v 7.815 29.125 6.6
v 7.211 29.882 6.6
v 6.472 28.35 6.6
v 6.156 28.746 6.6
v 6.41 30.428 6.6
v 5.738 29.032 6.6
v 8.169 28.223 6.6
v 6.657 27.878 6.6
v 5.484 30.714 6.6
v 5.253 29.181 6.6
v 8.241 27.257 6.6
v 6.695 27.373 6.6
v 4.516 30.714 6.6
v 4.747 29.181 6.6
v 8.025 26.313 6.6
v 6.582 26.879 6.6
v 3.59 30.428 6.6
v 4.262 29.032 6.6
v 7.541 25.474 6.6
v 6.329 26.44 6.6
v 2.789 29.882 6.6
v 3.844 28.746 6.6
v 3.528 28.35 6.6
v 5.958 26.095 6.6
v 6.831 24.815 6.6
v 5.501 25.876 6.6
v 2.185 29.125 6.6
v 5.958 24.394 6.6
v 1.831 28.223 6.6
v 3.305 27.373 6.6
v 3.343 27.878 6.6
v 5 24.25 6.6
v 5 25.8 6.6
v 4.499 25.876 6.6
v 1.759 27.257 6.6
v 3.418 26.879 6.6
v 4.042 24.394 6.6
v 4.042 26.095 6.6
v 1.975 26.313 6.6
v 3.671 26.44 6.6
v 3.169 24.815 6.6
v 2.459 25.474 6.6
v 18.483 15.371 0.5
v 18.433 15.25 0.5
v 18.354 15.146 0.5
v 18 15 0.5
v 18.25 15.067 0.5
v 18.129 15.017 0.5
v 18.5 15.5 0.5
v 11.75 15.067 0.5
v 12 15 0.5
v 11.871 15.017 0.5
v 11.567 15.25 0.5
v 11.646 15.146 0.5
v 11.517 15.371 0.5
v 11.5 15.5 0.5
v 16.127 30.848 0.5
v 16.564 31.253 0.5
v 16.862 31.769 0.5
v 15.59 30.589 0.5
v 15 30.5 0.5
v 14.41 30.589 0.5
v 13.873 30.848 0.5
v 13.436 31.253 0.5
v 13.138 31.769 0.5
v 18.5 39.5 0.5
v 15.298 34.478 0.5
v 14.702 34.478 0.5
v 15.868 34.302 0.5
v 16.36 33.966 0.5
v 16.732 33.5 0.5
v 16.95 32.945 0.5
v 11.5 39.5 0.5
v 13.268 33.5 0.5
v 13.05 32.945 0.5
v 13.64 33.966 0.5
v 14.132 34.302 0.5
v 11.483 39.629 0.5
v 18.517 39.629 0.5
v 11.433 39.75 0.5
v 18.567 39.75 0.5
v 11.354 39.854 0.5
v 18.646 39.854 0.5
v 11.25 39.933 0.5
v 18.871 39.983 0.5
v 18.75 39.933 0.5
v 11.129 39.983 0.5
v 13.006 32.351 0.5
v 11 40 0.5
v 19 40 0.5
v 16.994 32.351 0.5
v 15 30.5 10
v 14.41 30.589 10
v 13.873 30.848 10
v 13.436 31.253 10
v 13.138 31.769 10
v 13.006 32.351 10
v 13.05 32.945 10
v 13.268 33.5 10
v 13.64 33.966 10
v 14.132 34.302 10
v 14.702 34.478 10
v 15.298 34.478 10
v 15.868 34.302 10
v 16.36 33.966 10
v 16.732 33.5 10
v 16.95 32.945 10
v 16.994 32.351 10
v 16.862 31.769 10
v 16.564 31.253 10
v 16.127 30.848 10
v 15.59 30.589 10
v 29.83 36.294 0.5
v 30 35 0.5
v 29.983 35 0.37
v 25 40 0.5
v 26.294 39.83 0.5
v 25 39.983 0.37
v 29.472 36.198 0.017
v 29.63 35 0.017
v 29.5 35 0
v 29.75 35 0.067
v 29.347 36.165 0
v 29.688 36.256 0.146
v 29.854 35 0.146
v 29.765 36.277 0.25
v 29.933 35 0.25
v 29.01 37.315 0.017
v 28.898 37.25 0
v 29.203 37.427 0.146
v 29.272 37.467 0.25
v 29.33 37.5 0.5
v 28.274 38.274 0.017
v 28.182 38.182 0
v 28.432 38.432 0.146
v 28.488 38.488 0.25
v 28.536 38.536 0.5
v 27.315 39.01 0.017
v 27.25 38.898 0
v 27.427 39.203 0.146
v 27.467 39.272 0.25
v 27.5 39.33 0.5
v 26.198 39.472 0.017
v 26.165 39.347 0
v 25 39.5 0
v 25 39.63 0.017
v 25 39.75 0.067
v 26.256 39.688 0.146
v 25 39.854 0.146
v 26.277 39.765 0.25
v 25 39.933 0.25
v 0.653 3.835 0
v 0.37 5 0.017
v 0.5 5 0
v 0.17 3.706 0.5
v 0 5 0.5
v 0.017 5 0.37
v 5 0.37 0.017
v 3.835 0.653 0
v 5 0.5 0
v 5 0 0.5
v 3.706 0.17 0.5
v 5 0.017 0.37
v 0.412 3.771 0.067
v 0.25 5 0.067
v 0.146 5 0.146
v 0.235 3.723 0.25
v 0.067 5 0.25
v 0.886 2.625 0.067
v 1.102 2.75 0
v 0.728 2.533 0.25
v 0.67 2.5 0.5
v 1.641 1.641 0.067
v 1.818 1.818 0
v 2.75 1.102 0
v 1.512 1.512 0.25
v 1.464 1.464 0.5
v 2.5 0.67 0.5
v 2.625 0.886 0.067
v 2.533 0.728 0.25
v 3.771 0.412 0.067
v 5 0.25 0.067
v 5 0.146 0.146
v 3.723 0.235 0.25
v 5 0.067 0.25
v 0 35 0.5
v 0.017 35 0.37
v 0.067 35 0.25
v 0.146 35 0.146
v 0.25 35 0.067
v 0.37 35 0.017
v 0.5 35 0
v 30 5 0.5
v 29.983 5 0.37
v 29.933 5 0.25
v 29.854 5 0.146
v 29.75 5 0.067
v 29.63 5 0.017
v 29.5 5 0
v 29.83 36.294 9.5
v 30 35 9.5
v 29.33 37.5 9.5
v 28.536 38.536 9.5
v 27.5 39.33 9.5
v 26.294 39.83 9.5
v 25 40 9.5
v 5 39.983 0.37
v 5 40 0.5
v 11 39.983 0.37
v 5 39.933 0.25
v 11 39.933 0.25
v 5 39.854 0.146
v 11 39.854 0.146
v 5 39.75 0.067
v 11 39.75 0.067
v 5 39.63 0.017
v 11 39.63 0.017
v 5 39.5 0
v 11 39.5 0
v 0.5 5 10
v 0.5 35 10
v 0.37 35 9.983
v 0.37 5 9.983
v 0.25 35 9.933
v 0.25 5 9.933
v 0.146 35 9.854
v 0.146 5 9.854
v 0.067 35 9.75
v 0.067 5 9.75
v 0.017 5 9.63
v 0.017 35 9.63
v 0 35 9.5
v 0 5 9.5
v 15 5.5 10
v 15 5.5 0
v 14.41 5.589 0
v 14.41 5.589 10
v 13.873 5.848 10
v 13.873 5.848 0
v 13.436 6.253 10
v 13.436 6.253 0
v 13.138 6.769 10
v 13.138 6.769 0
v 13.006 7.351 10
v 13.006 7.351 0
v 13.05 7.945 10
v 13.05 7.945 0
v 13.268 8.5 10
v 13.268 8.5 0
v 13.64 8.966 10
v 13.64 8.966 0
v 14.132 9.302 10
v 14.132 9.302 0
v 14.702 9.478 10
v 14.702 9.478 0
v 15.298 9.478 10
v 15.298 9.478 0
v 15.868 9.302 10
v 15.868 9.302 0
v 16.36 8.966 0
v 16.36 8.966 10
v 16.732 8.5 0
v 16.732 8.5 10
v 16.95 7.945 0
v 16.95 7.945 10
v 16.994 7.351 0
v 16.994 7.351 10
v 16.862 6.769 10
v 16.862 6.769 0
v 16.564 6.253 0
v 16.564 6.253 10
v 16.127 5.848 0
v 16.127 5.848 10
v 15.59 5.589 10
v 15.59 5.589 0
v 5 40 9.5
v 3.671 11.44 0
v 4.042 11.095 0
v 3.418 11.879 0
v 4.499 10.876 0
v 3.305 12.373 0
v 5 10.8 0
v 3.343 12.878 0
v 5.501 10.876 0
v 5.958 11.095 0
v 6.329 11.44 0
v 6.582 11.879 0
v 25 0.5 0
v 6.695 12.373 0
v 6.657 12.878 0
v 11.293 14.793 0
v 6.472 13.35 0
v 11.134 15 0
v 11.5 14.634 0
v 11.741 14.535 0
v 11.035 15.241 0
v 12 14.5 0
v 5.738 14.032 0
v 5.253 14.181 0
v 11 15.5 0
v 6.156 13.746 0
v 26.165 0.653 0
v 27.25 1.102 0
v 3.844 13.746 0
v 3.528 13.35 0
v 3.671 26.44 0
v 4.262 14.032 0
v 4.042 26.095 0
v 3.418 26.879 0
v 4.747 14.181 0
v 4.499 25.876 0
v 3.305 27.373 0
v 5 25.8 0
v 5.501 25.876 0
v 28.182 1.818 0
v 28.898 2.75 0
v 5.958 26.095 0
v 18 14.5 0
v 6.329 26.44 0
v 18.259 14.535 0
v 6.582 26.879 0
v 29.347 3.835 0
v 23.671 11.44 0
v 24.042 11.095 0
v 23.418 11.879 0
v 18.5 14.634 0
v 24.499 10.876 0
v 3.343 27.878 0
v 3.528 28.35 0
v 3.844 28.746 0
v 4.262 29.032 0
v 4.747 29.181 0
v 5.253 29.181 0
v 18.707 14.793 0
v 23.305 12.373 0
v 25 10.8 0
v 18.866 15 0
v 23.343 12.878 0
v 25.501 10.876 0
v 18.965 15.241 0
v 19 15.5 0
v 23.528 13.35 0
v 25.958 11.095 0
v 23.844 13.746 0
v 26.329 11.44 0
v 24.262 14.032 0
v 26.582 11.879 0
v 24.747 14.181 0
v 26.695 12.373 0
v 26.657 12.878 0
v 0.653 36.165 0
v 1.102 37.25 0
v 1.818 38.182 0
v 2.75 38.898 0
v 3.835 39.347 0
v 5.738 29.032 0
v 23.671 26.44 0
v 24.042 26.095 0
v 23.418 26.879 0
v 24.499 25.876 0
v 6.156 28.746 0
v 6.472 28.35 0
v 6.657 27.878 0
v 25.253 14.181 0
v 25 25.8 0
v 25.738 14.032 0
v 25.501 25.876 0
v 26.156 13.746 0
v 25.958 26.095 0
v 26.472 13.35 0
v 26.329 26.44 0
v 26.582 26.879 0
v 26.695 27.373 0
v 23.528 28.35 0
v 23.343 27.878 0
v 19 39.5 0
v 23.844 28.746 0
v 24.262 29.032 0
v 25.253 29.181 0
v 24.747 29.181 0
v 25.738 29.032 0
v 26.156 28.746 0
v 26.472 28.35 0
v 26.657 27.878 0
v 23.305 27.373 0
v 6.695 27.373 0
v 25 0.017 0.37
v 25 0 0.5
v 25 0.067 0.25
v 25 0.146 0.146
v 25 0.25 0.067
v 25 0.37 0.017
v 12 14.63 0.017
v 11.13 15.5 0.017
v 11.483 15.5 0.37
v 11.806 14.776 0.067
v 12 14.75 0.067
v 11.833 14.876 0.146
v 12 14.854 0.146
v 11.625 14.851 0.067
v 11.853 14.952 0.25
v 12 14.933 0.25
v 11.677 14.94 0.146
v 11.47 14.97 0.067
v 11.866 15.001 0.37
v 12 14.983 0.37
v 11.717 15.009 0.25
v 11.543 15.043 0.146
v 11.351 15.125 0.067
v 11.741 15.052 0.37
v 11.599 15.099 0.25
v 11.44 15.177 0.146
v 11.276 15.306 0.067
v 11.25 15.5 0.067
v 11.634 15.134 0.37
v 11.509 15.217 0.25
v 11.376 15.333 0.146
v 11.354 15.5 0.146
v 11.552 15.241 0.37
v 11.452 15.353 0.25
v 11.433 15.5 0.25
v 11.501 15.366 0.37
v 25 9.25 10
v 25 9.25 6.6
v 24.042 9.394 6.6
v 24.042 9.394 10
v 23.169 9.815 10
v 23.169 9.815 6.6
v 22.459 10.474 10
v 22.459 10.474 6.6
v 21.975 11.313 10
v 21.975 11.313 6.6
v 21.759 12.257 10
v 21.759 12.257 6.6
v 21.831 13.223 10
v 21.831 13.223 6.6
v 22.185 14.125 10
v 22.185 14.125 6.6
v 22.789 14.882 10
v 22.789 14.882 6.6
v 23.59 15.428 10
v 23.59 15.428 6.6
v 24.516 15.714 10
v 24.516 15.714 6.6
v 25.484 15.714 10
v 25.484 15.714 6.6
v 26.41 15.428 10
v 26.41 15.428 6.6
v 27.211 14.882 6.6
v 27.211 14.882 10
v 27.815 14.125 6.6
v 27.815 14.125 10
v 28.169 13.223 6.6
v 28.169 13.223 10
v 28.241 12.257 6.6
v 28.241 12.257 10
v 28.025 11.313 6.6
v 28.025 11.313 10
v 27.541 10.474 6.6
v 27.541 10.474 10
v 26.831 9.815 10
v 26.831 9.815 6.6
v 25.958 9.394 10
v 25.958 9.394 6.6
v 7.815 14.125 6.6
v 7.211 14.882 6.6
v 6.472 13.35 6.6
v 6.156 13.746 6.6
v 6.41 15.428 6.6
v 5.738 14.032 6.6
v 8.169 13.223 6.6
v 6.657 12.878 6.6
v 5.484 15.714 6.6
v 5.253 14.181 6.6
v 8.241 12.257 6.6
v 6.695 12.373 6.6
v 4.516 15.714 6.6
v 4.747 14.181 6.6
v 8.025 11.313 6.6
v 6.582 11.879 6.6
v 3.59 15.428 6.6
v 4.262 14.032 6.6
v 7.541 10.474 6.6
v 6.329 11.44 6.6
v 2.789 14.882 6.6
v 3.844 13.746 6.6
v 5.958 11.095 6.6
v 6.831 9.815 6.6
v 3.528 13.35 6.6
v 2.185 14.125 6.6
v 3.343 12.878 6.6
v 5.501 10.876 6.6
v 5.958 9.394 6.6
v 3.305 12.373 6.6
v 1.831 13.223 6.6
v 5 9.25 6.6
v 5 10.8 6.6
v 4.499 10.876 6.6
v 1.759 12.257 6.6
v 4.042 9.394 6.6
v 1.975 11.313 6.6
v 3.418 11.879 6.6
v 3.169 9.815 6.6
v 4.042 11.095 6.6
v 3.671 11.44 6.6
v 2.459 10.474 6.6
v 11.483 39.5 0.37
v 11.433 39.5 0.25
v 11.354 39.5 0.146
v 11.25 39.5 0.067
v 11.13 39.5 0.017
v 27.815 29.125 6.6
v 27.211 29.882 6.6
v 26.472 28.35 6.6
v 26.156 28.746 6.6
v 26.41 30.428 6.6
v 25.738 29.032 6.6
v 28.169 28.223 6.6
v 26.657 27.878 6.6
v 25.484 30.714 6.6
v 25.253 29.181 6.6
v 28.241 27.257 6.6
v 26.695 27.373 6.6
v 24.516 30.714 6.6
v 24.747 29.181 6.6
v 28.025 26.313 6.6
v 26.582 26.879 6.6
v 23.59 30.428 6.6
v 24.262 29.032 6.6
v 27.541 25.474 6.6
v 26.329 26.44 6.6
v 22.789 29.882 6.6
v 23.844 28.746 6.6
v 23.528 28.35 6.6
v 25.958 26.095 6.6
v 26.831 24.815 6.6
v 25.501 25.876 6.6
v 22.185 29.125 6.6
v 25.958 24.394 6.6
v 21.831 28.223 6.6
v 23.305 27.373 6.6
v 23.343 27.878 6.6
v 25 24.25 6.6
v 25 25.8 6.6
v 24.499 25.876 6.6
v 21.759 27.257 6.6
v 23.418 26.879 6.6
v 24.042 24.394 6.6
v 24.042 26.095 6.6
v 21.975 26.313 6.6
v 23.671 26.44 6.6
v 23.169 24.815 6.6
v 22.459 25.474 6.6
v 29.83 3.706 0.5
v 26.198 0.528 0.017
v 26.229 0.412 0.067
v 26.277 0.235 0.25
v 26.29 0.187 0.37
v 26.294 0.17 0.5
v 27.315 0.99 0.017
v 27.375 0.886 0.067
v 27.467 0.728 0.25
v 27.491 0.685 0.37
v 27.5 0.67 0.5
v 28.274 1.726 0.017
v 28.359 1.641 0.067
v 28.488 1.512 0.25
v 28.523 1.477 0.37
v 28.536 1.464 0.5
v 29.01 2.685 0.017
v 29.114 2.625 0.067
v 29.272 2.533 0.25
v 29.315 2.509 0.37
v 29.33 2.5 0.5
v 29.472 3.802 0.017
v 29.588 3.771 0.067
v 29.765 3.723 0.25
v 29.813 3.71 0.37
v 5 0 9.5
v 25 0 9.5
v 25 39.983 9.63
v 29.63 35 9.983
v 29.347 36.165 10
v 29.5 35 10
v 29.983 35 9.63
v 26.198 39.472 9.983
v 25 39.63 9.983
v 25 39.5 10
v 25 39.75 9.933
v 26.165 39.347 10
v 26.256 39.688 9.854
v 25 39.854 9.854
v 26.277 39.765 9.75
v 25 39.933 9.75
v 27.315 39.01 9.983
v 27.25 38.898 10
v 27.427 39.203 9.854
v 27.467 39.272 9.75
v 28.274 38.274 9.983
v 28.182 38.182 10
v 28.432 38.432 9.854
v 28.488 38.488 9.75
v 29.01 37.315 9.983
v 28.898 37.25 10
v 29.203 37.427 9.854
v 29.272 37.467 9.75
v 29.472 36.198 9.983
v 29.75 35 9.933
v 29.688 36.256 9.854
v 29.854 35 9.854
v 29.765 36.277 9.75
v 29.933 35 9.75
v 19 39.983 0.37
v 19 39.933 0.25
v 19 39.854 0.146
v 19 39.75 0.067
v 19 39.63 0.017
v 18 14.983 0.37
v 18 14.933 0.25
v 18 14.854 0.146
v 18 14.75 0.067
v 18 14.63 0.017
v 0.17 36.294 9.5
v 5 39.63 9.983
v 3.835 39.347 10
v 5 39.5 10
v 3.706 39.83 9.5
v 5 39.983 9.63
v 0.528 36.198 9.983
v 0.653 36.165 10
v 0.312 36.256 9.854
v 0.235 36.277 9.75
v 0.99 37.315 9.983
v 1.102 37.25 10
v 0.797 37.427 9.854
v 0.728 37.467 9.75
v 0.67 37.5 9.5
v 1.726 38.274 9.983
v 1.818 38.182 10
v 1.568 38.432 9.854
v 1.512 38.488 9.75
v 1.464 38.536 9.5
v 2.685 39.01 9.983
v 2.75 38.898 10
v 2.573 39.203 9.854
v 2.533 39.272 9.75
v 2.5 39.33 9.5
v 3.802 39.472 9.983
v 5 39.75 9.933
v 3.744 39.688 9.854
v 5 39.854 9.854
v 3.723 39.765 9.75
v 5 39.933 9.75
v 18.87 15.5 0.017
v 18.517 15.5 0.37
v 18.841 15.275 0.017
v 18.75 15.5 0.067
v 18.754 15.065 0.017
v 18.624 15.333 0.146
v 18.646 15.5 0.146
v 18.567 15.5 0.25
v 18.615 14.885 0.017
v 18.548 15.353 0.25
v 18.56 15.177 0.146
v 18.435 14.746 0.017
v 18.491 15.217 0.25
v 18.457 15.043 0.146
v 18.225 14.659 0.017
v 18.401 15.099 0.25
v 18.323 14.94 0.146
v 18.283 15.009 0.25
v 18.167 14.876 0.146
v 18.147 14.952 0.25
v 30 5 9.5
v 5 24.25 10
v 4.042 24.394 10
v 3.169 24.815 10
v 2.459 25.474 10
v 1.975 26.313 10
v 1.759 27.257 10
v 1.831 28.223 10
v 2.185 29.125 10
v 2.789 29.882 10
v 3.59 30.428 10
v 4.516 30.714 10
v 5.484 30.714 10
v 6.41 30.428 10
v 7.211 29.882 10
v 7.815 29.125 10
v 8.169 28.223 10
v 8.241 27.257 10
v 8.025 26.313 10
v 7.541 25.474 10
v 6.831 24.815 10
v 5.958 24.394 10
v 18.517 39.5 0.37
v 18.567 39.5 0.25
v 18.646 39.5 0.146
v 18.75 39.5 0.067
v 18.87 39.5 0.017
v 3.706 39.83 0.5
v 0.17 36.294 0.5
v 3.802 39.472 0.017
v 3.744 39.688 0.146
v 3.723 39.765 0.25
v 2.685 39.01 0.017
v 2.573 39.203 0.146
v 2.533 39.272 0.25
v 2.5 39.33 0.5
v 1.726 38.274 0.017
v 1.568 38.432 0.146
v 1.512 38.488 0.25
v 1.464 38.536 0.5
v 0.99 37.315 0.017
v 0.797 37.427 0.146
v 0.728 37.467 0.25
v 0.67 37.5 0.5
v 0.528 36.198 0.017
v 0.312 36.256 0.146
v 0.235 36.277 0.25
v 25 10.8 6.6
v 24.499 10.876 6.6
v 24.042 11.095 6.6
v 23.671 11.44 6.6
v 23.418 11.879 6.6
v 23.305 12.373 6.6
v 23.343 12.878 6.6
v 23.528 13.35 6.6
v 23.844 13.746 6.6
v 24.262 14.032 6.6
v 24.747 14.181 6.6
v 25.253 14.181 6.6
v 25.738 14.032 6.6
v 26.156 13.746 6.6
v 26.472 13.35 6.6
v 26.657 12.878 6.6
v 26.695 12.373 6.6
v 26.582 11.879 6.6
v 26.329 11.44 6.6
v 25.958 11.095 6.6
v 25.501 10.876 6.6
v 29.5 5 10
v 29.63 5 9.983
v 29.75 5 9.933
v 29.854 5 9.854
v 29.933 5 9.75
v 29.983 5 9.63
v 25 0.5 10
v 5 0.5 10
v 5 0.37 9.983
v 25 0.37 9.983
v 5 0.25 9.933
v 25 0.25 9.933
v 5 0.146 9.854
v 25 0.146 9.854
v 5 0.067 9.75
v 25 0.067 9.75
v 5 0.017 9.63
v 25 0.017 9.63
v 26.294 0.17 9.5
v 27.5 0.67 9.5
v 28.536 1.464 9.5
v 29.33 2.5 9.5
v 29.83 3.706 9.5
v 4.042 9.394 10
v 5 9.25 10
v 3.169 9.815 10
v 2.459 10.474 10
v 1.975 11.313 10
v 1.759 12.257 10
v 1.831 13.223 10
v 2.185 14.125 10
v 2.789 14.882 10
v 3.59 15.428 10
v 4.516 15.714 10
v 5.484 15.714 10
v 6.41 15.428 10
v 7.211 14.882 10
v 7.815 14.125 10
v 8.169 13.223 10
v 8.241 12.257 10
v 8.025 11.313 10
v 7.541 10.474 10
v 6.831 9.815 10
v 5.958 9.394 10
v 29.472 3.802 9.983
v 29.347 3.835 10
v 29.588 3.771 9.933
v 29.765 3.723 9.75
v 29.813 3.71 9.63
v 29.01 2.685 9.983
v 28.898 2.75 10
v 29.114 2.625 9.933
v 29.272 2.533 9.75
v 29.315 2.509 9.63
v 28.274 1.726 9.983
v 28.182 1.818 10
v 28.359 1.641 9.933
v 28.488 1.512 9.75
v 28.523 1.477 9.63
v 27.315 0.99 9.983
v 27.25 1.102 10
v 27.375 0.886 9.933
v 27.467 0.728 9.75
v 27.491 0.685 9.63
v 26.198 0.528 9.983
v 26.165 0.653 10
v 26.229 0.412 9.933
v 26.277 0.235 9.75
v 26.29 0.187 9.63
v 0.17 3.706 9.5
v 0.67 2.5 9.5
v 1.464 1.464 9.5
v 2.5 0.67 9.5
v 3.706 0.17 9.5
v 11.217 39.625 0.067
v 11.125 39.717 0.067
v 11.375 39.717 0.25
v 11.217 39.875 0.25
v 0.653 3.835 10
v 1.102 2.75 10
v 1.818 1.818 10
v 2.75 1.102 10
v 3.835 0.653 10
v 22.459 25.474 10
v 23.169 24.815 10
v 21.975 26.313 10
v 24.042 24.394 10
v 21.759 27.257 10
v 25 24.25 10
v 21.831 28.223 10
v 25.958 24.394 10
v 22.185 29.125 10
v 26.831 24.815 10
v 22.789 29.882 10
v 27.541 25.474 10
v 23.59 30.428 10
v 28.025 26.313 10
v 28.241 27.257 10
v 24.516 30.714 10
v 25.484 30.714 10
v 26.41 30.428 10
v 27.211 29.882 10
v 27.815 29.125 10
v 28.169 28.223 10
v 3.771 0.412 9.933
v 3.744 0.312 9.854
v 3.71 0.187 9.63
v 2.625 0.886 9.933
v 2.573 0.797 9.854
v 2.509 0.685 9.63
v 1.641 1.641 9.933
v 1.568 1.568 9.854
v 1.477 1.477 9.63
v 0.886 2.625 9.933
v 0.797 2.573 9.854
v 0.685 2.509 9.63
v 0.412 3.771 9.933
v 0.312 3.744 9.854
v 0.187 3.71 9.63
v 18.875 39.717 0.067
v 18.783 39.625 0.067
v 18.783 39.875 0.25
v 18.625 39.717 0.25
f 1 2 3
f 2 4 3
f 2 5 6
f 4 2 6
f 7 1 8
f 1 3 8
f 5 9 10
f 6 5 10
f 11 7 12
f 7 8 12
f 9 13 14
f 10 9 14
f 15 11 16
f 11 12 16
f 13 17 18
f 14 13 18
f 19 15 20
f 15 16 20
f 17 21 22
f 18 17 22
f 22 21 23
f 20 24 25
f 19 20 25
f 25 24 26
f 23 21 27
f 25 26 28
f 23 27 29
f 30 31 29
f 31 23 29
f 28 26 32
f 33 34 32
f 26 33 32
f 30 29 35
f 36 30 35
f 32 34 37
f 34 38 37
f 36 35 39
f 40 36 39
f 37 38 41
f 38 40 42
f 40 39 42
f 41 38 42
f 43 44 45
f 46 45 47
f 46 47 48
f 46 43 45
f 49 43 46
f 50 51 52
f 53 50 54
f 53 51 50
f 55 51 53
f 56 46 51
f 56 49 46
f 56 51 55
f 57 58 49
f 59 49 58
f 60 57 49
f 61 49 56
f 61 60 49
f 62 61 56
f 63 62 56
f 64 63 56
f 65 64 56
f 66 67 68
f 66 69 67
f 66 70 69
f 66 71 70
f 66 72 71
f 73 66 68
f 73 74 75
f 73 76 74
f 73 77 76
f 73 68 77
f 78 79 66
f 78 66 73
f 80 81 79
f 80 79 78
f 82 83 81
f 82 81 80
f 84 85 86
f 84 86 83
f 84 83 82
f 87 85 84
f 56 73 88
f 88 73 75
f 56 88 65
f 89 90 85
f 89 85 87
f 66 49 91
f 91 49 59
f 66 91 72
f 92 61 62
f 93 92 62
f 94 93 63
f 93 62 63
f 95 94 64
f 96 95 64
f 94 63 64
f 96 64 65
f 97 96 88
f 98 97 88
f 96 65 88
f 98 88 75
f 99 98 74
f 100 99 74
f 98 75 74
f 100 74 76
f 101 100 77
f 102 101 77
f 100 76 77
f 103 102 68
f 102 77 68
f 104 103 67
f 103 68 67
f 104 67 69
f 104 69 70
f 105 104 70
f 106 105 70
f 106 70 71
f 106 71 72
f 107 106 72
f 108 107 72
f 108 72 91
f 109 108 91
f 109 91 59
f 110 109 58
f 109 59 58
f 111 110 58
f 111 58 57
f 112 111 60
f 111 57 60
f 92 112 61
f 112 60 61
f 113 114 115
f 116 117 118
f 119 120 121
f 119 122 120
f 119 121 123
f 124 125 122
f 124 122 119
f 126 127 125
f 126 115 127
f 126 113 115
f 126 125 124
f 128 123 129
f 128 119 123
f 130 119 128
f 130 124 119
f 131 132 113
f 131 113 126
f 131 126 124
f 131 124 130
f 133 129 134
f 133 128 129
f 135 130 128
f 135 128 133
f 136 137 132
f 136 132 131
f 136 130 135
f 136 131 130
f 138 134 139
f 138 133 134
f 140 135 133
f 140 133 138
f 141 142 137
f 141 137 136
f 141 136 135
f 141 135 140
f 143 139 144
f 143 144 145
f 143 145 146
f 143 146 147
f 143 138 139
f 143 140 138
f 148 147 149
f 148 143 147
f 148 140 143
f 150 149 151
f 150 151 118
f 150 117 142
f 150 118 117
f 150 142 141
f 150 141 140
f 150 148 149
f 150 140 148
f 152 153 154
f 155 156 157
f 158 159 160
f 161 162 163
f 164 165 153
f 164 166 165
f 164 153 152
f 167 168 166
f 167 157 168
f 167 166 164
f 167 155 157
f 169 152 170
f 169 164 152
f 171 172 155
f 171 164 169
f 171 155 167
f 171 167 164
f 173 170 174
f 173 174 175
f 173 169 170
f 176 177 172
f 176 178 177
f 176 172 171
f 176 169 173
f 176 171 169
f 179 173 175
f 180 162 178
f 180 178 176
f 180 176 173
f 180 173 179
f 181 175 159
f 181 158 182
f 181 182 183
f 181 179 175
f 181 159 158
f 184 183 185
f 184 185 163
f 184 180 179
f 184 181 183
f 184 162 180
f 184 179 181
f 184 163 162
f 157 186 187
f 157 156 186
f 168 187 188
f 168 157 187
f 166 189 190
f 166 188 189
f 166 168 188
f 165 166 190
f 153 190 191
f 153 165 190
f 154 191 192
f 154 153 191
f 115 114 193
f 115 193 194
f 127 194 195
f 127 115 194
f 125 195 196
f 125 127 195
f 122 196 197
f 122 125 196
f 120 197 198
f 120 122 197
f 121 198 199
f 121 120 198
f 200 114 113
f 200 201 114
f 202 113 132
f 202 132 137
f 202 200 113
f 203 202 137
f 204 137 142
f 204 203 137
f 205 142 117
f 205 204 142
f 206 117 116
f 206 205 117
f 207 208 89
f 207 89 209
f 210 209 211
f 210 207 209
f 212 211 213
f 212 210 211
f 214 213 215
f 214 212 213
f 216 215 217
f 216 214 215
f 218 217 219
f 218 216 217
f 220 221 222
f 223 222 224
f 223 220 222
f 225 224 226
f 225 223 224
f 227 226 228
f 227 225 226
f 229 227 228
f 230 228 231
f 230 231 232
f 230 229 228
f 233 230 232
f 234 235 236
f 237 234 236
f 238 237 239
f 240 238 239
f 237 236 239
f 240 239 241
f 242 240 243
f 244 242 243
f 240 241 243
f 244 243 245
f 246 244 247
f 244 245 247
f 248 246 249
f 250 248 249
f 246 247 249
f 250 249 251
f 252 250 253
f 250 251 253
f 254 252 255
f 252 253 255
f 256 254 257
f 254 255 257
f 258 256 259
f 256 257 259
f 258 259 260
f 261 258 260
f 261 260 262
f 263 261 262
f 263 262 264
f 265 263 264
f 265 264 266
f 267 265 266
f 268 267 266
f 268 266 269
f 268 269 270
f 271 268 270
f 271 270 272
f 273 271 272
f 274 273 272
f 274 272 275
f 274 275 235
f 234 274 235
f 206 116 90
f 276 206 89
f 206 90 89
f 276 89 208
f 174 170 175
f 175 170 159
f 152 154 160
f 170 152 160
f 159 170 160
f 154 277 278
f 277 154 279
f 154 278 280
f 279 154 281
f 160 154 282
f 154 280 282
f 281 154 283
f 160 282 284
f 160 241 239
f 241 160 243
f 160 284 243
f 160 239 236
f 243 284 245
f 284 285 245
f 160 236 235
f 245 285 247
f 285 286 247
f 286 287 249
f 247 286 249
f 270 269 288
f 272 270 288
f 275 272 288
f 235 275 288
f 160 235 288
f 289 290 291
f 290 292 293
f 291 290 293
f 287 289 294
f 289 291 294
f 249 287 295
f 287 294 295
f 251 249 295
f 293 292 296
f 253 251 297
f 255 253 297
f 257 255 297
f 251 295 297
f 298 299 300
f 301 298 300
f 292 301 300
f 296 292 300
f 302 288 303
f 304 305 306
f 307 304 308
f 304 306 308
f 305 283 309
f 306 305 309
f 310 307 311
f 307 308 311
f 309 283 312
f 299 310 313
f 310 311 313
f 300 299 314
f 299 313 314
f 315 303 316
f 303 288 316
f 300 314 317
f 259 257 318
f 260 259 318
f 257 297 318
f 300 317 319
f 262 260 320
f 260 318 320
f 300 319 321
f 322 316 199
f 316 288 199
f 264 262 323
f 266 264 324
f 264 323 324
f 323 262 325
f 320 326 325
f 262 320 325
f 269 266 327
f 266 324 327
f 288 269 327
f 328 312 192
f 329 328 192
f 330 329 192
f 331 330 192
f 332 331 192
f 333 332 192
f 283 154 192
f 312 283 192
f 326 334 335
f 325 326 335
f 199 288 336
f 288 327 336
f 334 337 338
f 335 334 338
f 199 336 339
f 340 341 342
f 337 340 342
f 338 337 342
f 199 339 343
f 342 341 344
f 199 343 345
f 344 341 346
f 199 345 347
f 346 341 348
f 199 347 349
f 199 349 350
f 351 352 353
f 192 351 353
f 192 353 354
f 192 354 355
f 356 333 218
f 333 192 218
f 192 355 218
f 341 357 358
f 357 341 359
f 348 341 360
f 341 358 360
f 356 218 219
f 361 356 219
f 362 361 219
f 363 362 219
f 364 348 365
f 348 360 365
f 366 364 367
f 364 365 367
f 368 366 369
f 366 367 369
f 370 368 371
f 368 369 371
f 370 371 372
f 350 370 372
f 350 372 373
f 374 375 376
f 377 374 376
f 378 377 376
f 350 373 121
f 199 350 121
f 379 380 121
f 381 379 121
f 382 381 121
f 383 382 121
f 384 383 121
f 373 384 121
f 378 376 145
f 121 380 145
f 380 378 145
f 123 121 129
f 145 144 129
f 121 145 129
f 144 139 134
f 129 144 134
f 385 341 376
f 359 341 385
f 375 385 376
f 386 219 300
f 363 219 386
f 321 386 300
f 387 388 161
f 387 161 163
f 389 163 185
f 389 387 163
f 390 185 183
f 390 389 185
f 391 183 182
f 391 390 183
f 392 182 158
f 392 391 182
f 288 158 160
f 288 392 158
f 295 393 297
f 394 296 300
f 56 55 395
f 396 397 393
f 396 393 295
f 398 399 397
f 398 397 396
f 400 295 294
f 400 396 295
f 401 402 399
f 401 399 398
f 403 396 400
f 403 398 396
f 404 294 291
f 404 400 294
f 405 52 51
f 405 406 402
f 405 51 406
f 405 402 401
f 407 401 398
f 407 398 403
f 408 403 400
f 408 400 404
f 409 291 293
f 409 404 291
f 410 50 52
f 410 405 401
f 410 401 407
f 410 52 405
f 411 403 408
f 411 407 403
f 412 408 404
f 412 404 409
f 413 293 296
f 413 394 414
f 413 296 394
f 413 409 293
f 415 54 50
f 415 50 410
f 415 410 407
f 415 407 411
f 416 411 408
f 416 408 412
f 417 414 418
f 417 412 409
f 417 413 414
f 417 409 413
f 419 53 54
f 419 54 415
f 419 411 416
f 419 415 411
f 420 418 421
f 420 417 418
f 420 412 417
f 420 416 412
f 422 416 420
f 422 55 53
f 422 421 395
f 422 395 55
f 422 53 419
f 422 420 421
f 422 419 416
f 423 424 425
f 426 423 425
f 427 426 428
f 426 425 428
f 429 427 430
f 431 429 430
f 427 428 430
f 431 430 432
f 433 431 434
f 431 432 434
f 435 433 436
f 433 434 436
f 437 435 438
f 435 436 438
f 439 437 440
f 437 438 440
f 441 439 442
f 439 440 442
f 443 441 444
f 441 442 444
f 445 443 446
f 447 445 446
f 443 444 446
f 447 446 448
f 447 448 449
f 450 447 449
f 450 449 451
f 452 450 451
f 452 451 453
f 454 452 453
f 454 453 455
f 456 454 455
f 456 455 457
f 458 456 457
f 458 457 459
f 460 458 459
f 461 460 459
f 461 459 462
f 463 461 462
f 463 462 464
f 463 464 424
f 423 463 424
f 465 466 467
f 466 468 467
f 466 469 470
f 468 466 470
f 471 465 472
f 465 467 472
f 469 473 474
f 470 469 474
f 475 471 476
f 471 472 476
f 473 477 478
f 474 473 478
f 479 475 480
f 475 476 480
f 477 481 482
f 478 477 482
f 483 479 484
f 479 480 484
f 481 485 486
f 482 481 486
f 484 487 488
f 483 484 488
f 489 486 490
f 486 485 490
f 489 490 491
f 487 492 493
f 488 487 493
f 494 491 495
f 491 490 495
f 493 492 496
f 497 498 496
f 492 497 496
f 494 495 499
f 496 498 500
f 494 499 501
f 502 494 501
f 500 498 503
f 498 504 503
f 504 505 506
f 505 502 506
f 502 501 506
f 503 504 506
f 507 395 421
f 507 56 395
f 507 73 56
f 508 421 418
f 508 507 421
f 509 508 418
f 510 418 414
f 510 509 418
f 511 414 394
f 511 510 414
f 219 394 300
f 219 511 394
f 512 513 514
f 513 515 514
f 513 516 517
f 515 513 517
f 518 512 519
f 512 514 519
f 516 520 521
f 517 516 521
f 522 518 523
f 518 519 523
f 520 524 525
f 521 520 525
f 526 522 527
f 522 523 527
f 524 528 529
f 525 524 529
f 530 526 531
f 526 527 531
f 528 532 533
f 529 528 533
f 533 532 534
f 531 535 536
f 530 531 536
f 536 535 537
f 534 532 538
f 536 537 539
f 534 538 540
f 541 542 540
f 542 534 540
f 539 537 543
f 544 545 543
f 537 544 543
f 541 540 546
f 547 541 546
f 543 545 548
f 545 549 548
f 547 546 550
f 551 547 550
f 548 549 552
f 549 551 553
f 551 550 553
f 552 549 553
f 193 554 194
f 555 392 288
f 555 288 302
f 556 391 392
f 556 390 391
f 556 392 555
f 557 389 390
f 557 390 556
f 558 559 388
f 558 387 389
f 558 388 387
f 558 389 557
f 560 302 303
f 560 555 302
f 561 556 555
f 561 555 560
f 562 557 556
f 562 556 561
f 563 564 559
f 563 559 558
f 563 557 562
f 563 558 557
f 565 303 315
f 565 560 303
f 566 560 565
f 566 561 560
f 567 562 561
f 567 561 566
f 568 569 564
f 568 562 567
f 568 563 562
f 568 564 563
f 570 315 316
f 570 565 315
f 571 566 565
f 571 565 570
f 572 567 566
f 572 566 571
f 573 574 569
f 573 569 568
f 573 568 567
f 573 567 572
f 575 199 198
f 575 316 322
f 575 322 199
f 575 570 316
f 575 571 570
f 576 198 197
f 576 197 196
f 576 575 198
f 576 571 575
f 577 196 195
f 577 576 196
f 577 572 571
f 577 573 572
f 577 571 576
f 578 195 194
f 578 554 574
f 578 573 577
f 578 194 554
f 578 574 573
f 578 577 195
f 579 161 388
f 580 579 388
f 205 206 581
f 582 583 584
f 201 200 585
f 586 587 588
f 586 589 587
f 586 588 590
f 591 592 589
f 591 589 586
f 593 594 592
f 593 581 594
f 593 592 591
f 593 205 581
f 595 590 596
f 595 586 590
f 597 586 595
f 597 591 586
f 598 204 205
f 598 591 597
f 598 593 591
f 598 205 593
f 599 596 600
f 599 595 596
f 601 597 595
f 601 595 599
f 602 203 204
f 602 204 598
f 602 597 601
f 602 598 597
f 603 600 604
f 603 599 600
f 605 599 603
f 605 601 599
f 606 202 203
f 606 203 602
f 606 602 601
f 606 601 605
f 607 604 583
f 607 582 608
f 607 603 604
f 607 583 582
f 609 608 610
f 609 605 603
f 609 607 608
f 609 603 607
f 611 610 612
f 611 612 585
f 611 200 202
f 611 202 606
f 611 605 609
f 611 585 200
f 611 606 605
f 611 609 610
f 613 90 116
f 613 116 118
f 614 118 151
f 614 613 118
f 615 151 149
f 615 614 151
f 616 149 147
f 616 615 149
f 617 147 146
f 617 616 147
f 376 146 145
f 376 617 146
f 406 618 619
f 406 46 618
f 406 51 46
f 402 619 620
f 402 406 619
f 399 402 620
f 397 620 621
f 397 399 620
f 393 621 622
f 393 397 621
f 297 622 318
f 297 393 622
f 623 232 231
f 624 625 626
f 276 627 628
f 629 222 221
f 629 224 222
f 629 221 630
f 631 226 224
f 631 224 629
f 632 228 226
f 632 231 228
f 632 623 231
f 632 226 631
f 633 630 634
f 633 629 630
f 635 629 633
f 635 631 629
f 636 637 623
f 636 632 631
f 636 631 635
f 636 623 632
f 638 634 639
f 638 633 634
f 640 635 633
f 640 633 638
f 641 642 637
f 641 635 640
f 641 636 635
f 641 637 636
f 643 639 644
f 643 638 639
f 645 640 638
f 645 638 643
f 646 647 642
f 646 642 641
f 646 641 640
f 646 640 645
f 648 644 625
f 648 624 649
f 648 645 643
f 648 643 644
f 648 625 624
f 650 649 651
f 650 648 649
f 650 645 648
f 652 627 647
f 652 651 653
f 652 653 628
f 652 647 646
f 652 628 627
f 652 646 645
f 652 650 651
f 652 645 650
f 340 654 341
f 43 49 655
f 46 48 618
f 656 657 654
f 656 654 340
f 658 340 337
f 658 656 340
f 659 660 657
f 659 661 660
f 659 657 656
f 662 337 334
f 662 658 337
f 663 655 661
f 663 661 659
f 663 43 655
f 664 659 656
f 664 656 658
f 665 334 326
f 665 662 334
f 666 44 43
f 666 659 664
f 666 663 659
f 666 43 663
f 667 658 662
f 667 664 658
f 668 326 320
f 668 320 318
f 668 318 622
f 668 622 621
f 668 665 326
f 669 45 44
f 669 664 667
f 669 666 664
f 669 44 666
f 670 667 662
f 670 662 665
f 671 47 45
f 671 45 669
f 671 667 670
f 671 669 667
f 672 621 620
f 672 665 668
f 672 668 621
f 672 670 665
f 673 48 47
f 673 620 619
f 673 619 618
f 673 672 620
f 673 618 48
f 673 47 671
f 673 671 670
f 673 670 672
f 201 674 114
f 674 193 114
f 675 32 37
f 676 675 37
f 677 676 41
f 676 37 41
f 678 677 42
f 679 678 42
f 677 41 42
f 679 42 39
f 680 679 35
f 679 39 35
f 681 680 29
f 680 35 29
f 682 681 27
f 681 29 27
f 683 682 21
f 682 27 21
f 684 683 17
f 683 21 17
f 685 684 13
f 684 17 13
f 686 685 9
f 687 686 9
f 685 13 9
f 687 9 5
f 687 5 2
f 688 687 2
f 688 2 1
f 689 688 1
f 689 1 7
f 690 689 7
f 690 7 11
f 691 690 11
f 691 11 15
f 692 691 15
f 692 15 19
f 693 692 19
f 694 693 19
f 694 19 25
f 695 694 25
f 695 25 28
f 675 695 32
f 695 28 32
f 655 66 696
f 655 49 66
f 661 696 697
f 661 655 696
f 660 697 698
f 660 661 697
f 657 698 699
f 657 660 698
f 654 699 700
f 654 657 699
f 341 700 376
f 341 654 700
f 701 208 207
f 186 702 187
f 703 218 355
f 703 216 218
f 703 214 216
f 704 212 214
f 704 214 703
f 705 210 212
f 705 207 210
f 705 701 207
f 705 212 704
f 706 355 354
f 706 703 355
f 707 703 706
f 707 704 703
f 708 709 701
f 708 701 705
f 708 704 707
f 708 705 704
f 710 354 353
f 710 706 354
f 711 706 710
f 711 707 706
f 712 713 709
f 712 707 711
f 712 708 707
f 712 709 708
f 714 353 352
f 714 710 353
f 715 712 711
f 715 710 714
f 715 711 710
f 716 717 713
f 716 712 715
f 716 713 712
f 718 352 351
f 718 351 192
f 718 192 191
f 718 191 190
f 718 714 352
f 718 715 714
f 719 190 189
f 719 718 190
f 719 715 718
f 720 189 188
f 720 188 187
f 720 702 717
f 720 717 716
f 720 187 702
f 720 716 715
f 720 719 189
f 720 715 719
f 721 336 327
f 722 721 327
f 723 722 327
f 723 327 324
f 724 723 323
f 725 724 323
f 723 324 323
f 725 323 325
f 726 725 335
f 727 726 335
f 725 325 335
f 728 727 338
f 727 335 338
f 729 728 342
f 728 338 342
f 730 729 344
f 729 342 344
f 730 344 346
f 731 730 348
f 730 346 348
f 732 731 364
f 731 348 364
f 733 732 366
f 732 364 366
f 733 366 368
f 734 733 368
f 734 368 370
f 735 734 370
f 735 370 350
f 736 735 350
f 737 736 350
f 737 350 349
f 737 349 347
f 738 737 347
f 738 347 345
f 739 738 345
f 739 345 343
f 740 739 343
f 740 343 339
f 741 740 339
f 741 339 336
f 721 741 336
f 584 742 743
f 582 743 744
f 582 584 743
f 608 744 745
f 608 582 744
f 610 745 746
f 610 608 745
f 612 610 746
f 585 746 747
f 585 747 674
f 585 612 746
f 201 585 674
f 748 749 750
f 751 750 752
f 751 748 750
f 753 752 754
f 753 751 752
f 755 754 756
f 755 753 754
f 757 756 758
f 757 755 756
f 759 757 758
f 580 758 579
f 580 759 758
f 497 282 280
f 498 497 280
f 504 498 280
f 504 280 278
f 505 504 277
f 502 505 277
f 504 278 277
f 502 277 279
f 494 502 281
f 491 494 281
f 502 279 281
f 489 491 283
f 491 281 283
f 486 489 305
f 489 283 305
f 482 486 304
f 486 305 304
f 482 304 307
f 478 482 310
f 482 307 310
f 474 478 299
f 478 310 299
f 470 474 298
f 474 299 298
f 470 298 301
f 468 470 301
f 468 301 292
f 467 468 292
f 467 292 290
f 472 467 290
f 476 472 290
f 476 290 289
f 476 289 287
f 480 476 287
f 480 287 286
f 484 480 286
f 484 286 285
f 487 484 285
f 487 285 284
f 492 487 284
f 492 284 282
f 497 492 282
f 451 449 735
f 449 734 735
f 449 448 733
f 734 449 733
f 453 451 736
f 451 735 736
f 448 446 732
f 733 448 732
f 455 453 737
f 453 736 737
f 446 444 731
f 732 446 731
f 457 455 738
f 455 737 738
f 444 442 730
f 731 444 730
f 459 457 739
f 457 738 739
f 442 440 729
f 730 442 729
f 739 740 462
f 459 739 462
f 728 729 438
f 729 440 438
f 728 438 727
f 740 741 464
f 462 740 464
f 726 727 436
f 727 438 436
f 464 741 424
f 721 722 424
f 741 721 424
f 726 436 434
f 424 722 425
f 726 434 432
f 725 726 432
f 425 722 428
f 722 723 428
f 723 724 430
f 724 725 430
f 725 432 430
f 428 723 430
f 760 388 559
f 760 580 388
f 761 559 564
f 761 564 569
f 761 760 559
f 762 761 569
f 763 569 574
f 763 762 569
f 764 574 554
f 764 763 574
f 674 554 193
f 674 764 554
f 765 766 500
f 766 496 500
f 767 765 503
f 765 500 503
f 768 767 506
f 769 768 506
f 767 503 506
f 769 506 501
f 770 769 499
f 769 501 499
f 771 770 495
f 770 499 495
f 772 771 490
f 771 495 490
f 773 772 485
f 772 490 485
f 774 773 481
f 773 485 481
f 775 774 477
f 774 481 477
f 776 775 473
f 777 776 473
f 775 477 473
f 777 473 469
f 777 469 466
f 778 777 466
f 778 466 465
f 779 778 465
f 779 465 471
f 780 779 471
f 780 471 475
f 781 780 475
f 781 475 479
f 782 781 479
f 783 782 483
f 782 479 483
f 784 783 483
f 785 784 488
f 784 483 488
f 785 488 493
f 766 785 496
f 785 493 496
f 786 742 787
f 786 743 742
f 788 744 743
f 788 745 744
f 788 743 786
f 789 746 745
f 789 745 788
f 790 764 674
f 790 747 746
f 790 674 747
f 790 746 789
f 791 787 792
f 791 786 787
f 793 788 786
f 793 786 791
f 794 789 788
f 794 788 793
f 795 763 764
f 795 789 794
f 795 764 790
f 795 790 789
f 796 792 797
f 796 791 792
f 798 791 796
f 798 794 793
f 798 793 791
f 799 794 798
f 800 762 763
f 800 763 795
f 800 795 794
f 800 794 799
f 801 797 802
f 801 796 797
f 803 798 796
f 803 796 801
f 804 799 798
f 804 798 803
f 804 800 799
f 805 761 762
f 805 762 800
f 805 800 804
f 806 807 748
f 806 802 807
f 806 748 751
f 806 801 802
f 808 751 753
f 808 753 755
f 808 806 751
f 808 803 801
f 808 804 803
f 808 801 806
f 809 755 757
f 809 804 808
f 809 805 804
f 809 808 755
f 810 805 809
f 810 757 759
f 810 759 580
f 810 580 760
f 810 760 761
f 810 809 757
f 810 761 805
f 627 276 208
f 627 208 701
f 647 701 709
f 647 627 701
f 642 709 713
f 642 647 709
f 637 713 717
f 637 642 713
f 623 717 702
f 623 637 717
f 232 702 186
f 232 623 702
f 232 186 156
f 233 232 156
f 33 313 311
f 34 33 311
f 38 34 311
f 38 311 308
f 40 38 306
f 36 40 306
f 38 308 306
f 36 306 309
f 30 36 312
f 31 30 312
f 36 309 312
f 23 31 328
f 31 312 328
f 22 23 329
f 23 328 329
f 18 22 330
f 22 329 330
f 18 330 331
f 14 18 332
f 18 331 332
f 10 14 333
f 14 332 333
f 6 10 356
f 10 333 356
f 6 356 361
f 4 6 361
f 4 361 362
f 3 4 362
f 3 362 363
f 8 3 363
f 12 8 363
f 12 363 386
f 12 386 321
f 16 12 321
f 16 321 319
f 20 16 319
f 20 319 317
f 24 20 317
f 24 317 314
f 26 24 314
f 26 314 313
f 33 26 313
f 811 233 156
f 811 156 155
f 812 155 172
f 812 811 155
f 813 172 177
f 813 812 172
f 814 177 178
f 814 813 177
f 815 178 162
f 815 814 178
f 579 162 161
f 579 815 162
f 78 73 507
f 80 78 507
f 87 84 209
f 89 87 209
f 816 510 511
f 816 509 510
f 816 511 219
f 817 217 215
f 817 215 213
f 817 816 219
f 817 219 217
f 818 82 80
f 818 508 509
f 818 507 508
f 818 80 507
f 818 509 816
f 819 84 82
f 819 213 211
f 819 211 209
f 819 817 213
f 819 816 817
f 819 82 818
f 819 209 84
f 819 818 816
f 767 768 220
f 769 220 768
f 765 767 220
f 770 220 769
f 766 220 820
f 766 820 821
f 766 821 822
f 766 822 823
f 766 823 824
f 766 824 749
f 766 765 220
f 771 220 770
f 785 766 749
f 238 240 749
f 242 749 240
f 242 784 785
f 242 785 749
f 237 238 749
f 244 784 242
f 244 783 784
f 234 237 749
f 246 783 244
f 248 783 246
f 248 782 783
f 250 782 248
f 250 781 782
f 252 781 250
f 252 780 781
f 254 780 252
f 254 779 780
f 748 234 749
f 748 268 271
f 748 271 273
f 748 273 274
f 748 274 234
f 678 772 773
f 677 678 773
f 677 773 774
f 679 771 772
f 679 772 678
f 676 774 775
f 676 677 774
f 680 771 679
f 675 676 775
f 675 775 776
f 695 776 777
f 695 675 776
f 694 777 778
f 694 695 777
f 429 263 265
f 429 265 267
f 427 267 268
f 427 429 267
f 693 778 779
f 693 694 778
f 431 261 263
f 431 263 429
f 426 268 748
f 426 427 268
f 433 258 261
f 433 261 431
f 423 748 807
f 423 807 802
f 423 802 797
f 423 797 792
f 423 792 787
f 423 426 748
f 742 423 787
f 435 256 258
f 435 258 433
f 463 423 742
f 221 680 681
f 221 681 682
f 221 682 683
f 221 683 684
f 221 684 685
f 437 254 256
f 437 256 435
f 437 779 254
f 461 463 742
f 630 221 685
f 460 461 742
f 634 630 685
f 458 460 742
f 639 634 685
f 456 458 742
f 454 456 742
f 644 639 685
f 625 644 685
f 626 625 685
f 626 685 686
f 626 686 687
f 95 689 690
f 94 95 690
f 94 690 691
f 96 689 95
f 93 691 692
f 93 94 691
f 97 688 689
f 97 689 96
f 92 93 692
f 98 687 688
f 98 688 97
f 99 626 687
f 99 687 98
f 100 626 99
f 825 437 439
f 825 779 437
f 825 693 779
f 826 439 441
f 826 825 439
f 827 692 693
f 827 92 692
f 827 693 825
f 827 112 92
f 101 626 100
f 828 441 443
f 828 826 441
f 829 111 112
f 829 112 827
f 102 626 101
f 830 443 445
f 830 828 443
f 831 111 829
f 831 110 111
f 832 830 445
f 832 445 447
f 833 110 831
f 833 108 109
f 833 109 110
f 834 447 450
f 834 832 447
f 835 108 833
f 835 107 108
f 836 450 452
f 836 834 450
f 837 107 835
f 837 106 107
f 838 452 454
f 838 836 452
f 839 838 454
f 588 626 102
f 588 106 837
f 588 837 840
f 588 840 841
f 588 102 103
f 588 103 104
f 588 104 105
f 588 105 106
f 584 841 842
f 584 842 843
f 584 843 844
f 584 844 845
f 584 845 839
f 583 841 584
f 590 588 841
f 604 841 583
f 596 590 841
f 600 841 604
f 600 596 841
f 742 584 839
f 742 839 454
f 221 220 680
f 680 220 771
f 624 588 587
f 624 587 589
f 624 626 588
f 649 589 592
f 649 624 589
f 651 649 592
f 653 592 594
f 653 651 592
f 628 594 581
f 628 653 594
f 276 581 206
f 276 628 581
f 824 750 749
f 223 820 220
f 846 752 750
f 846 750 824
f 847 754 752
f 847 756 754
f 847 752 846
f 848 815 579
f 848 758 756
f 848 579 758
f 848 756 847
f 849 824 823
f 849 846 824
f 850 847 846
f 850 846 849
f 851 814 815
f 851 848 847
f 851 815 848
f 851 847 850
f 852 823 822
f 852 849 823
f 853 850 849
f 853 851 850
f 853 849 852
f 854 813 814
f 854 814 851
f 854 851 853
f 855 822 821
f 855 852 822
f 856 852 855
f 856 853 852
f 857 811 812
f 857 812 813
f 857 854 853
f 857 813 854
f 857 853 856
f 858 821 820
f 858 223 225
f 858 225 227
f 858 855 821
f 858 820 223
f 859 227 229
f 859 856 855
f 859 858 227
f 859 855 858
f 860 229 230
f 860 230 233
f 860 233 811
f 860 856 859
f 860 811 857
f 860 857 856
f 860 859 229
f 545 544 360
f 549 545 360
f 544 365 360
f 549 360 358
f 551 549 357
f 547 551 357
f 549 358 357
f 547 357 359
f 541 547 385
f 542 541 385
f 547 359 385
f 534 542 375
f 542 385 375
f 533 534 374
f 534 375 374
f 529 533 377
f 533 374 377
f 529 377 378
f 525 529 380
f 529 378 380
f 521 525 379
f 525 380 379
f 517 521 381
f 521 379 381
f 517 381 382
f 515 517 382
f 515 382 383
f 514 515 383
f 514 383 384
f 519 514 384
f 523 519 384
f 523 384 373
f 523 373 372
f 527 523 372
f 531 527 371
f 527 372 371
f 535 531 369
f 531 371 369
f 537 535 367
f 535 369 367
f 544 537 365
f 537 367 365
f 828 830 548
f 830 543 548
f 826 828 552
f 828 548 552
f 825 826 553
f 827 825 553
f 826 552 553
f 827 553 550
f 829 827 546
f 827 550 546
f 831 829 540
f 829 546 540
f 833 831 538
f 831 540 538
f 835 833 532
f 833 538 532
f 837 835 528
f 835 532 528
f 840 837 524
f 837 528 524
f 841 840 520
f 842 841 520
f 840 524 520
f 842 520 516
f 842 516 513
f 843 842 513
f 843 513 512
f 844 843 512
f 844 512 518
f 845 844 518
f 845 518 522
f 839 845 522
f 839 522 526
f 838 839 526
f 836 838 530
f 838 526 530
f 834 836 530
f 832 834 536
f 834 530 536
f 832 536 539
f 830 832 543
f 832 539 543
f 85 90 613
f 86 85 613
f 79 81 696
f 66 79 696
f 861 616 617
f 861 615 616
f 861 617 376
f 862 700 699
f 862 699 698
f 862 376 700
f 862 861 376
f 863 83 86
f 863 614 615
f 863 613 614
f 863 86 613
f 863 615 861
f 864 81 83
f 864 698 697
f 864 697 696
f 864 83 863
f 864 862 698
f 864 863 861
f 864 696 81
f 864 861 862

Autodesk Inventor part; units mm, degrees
ref_plane "YZ Plane" through (0, 0, 0) normal (1, 0, 0) x (0, 1, 0)
ref_plane "XZ Plane" through (0, 0, 0) normal (0, 1, 0) x (-1, 0, 0)
ref_plane "XY Plane" through (0, 0, 0) normal (0, 0, 1) x (1, 0, 0)
sketch "Skizze1" plane through (0, 0, 0) normal (0, 0, 1) x (1, 0, 0)
  line L0 (0, 0) -> (30, 0)
  line L1 (30, 0) -> (30, 40)
  line L2 (30, 40) -> (0, 40)
  line L3 (0, 40) -> (0, 0)
  dimension "d0" = 30
  dimension "d1" = 40
extrude "Extrusion1" add sketch "Skizze1" along normal blind 10
sketch "Skizze2" plane through (0, 0, 10) normal (0, 0, 1) x (1, 0, 0)
  line L0 (5, 27.5) -> (25, 27.5) construction
  line L1 (25, 27.5) -> (25, 12.5) construction
  line L2 (25, 12.5) -> (5, 12.5) construction
  line L3 (5, 12.5) -> (5, 27.5) construction
  line L4 (30, 40) -> (0, 40) construction
  line L5 (15, 27.5) -> (15, 40) construction
  line L6 (15, 12.5) -> (15, 0) construction
  line L7 (0, 0) -> (30, 0) projected
  dimension "d5" = 15
  dimension "d8" = 20
hole "Bohrung1" at (5, 27.5, 10) at (25, 27.5, 10) at (25, 12.5, 10) at (5, 12.5, 10) direction (0, 0, -1) diameter 3.4 end through all counterbore diameter 6.5 counterbore depth 3.4 clearance for "Inbusschraube ISO 4762" size "M3" standard "ISO"
sketch "Skizze3" plane through (0, 0, 0) normal (0, 0, -1) x (-1, 0, 0)
  line L0 (-18.5, 40) -> (-11.5, 40)
  line L1 (-11.5, 40) -> (-11.5, 15)
  line L2 (-11.5, 15) -> (-18.5, 15)
  line L3 (-18.5, 15) -> (-18.5, 40)
  line L4 (-30, 40) -> (0, 40) projected
  point P0 (0, 0)
  point P1 (-15, 40)
  dimension "d19" = 7
  dimension "d20" = 25
extrude "Extrusion2" cut sketch "Skizze3" against normal blind 0.5
fillet "Rundung3" radius 0.5 4 edges at (18.5, 40, 0.25) (11.5, 40, 0.25) (18.5, 15, 0.25) (11.5, 15, 0.25)
fillet "Rundung1" radius 5 4 edges at (0, 40, 5) (30, 40, 5) (0, 0, 5) (30, 0, 5)
fillet "Rundung2" radius 0.5 17 edges at (1.4645, 1.4645, 0) (15, 0, 0) (28.5355, 1.4645, 0) (30, 20, 0) (28.5355, 38.5355, 0) (8, 40, 0) (22, 40, 0) (1.4645, 38.5355, 0) (0, 20, 0) (1.4645, 38.5355, 10) (0, 20, 10) (1.4645, 1.4645, 10) (15, 0, 10) (28.5355, 1.4645, 10) (30, 20, 10) (28.5355, 38.5355, 10) (15, 40, 10)
sketch "Skizze4" plane through (0, 0, 10) normal (0, 0, 1) x (1, 0, 0)
  line L0 (19, 40) -> (11, 40) construction
  line L1 (15, 40) -> (15, 32.5) construction
  line L2 (15, 32.5) -> (15, 7.5) construction
  line L3 (15, 7.5) -> (15, 0) construction
  line L4 (25, 0) -> (5, 0) construction
  point P0 (0, 0)
  dimension "d24" = 25
hole "Bohrung2" at (15, 32.5, 10) at (15, 7.5, 10) direction (0, 0, -1) diameter 4 end through all
properties part number "AdapterLinearGuideShort"
